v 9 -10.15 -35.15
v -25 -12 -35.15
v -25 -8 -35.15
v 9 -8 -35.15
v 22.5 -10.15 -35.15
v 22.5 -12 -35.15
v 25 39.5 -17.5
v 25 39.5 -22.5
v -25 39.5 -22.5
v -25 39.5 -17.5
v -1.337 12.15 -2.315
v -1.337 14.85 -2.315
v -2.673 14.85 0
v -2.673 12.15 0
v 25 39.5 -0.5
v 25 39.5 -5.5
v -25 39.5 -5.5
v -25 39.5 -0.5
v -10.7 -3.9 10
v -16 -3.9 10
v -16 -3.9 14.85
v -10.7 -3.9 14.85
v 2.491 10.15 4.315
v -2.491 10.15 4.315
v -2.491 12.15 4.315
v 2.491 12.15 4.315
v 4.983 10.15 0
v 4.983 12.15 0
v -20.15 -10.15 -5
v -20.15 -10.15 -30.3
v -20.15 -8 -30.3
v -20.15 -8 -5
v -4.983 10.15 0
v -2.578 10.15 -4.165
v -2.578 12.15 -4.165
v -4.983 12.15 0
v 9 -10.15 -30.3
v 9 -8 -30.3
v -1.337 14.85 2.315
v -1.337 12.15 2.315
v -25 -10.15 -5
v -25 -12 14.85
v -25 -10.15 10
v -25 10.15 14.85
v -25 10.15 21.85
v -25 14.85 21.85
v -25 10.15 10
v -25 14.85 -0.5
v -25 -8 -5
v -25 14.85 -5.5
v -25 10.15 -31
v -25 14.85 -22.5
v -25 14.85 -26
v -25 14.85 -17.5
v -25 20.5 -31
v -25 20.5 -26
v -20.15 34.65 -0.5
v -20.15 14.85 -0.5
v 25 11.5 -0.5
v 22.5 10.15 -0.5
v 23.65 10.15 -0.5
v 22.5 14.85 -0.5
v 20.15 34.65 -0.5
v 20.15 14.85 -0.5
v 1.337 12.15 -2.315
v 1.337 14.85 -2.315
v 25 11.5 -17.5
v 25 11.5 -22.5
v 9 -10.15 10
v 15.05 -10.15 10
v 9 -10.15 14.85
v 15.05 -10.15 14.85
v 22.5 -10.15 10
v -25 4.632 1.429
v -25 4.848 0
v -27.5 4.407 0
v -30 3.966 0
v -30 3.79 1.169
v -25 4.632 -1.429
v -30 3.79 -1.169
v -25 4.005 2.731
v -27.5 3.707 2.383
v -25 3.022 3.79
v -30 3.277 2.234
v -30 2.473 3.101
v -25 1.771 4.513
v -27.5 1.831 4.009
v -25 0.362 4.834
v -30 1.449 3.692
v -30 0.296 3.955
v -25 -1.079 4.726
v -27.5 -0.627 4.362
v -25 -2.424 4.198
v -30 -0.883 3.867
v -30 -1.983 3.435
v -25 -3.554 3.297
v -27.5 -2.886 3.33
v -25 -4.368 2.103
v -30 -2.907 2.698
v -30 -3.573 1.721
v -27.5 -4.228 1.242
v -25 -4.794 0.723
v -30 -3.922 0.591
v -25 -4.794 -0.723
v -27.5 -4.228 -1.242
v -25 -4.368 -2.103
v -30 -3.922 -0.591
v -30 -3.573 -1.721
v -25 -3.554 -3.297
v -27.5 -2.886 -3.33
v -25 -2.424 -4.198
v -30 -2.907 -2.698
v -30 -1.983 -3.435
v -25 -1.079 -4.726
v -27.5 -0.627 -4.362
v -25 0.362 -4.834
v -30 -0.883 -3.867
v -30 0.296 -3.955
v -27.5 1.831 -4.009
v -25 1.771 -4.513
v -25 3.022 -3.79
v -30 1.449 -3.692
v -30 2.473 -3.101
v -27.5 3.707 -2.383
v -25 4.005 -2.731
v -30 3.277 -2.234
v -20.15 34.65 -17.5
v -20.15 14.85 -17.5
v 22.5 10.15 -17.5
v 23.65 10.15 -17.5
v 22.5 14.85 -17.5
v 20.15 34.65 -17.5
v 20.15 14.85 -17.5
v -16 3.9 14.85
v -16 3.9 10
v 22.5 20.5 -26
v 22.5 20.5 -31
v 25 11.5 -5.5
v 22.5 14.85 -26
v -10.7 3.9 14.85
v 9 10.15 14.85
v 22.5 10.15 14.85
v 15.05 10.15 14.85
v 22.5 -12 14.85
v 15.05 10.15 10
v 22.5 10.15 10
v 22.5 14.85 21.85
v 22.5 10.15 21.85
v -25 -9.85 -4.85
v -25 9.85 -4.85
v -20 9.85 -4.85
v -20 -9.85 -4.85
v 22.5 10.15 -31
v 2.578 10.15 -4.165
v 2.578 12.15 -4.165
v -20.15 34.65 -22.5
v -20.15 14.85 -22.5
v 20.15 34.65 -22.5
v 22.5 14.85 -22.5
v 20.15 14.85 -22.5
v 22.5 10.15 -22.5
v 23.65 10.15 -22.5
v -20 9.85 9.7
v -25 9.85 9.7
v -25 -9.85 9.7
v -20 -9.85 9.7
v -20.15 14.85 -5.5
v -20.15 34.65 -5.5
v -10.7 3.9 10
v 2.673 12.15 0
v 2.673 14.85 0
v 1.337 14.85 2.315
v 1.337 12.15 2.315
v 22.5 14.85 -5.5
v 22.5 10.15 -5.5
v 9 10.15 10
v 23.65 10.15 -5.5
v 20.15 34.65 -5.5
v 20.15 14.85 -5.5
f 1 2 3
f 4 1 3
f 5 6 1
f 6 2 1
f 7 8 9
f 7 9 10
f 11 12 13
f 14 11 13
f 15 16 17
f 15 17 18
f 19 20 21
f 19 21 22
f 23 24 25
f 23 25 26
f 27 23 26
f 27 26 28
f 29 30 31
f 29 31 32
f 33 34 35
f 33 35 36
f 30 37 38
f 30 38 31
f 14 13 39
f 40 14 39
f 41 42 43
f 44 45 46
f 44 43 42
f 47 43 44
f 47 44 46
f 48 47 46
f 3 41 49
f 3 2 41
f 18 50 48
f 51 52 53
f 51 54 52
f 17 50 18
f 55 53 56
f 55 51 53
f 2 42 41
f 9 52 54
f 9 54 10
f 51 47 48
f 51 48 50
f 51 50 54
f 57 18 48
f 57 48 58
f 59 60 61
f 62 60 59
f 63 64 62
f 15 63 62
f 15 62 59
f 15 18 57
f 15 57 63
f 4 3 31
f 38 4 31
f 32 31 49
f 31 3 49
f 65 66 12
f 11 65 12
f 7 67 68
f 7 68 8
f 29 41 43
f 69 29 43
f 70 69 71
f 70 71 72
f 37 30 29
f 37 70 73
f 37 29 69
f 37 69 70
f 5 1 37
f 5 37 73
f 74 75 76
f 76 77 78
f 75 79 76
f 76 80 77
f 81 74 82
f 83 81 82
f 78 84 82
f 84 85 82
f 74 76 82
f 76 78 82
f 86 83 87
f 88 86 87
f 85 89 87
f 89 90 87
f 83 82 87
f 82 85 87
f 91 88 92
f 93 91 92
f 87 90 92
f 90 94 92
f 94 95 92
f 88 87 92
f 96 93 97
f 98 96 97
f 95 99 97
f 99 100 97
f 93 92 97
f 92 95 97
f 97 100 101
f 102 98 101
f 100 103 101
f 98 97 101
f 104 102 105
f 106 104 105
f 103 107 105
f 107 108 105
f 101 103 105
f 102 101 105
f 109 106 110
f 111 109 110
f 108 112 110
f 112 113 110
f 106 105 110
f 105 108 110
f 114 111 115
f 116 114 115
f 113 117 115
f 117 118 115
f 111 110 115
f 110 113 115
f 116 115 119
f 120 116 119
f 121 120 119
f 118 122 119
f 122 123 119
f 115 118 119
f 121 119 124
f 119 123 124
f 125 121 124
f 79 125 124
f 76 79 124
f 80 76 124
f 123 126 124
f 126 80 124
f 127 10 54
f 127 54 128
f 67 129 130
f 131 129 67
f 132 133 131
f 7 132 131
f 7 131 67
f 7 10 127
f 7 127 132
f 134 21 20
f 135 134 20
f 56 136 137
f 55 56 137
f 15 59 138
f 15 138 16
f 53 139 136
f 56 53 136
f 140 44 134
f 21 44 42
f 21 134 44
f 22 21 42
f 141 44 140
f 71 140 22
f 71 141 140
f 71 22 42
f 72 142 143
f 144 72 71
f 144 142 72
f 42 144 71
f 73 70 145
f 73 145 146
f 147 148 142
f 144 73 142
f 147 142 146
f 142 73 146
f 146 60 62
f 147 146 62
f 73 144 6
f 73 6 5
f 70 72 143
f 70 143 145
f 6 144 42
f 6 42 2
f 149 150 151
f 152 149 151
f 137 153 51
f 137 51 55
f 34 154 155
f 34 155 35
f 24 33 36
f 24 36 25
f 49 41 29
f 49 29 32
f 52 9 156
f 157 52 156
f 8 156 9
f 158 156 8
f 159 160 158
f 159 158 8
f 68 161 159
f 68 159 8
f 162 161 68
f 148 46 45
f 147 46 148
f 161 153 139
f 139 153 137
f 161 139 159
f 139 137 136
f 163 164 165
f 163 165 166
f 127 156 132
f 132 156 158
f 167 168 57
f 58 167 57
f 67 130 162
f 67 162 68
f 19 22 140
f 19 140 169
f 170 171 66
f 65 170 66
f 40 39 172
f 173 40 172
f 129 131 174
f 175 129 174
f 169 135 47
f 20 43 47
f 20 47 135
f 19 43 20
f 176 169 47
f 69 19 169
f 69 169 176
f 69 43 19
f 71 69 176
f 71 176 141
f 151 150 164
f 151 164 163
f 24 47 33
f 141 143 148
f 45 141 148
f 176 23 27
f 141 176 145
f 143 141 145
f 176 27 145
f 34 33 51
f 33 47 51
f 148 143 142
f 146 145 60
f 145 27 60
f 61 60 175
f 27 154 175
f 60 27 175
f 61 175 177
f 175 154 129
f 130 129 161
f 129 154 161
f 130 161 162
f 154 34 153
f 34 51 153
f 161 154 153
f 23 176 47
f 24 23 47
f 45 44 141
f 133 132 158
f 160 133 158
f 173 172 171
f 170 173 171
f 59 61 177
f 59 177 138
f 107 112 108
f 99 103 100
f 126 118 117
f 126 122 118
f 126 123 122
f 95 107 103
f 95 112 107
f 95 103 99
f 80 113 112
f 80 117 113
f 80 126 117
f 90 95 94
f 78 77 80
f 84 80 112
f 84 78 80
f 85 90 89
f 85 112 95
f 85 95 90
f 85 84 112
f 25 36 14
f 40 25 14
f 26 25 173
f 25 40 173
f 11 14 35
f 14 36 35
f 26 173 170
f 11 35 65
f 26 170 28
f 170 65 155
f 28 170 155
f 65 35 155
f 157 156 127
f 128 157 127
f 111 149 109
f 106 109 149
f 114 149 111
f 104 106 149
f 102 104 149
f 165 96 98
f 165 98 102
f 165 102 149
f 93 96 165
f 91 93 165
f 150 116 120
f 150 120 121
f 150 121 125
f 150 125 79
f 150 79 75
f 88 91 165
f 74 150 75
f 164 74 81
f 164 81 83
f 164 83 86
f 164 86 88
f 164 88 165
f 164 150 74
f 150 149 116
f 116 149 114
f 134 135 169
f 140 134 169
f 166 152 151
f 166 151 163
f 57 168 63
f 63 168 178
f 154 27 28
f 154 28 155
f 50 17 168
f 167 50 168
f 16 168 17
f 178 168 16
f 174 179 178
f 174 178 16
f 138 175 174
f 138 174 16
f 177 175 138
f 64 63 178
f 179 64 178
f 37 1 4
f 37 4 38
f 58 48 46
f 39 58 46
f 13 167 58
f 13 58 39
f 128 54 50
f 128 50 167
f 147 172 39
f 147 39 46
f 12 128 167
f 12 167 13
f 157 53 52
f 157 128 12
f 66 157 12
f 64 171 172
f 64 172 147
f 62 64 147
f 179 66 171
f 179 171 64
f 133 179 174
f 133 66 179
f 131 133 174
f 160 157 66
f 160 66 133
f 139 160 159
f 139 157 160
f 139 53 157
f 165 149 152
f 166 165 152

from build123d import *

# Parameters (mm, degrees)
MAIN_BODY_EXTRUDE_DEPTH            = 25
SKETCH2_W                          = 40
SKETCH2_H                          = 19.5
SKETCH2_W_2                        = 5.75
SKETCH2_H_2                        = 20
CUT_OUT_FOR_SERVO_AND_CAMERA_DEPTH = 69.448886039
CUT_EXTRUDE2_DEPTH                 = 5
CUT_EXTRUDE3_START                 = -5
CUT_EXTRUDE3_DEPTH                 = 2
MOVE_FACE1_BY                      = 2
SKETCH6_W                          = 5
SKETCH6_H                          = 7.5
CABLE_CLEARANCE_DEPTH              = 5
SKETCH7_W                          = 5
SKETCH7_H                          = 5.5
BOSS_EXTRUDE1_DEPTH                = 50
SKETCH8_R                          = 5
BOSS_EXTRUDE2_DEPTH                = 5
SKETCH8_3_R                        = 5
BOSS_EXTRUDE3_DEPTH                = 5
BOSS_EXTRUDE3_TAPER                = 10
SKETCH9_W                          = 25.15
SKETCH9_H                          = 2
BOSS_EXTRUDE4_DEPTH                = 5
INSET_THE_WALL_DEPTH               = 2.5
FRAME_CHAMFER_1_DEPTH              = 5
FRAME_START                        = -17
FRAME_CHAMFER_2_DEPTH              = 5
SKETCH12_W                         = 47.5
SKETCH12_H                         = 5
BOSS_EXTRUDE7_DEPTH                = 7
OFFSET_START                       = -5
OFFSET_FOR_3D_PRINT_OUTLINE_W      = 13
OFFSET_FOR_3D_PRINT_OUTLINE_H      = 0.15
OFFSET_FOR_3D_PRINT_DEPTH          = 14.85
OFFSET_FOR_3D_PRINT_2_OUTLINE_W    = 13
OFFSET_FOR_3D_PRINT_2_OUTLINE_H    = 19.7
OFFSET_FOR_3D_PRINT_2_DEPTH        = 0.15
OFFSET_START_2                     = 9.7
OFFSET_FOR_3D_PRINT_3_OUTLINE_W    = 13
OFFSET_FOR_3D_PRINT_3_OUTLINE_H    = 19.7
OFFSET_FOR_3D_PRINT_3_DEPTH        = 0.15
OFFSET_START_3                     = -10.15
OFFSET_FOR_3D_PRINT_5_DEPTH        = 20.3
OFFSET_START_4                     = 14.85
OFFSET_FOR_3D_PRINT_6_DEPTH        = 19.8
OFFSET_START_5                     = 10
OFFSET_FOR_3D_PRINT_7_DEPTH        = 0.15
OFFSET_START_6                     = -3.9
OFFSET_FOR_3D_PRINT_8_OUTLINE_W    = 5.3
OFFSET_FOR_3D_PRINT_8_OUTLINE_H    = 4.85
OFFSET_FOR_3D_PRINT_8_DEPTH        = 7.8
OFFSET_START_7                     = 10.15
OFFSET_FOR_3D_PRINT_9_DEPTH        = 2
OFFSET_START_8                     = 12.15
OFFSET_FOR_3D_PRINT_10_DEPTH       = 2.7


with BuildPart() as part:
    # Sketch1 → Main Body Extrude (new, symmetric)
    with BuildSketch(Plane(origin=(0, 0, 0), x_dir=(0, 0, -1), z_dir=(1, 0, 0))):
        Polygon((-14.85, -12), (35.15, -12), (35.15, -8), (30.15, -8), (30.15, -10), (-9.85, -10), (-9.85, 10), (22.5, 10), (22.5, 39.5), (17.5, 39.5), (17.5, 15), (5.5, 15), (5.5, 39.5), (0.5, 39.5), (0.5, 15), (-14.85, 15), align=None)
    extrude(amount=MAIN_BODY_EXTRUDE_DEPTH, both=True)

    # Sketch2 → Cut out for Servo and camera (cut, through all)
    with BuildSketch(Plane.XY.offset(14.85)):
        with Locations((0, 24.75)):
            Rectangle(SKETCH2_W, SKETCH2_H)
        with Locations((12.025, 0)):
            Rectangle(SKETCH2_W_2, SKETCH2_H_2)
    extrude(amount=-CUT_OUT_FOR_SERVO_AND_CAMERA_DEPTH, mode=Mode.SUBTRACT)

    # Sketch3 → Cut-Extrude2 (cut)
    with BuildSketch(Plane(origin=(0, 15, 0), x_dir=(1, 0, 0), z_dir=(0, 1, 0))):
        Polygon((2.5, 0), (1.25, 2.165063509), (-1.25, 2.165063509), (-2.5, 0), (-1.25, -2.165063509), (1.25, -2.165063509), align=None)
    extrude(amount=-CUT_EXTRUDE2_DEPTH, mode=Mode.SUBTRACT)

    # Sketch3<3> → Cut-Extrude3 (cut)
    with BuildSketch(Plane(origin=(0, 15, 0), x_dir=(1, 0, 0), z_dir=(0, 1, 0)).offset(CUT_EXTRUDE3_START)):
        Polygon((4.809401077, 0), (2.404700538, 4.165063509), (-2.404700538, 4.165063509), (-4.809401077, 0), (-2.404700538, -4.165063509), (2.404700538, -4.165063509), align=None)
    extrude(amount=CUT_EXTRUDE3_DEPTH, mode=Mode.SUBTRACT)

    # Move Face1: a face moved inward by 2.0
    extrude(part.faces().sort_by_distance((19.95, -8, -32.65))[0], amount=MOVE_FACE1_BY, dir=(0, -1, 0), mode=Mode.SUBTRACT)

    # Sketch6 → Cable Clearance (cut)
    with BuildSketch(Plane.XY.offset(14.85)):
        with Locations((-13.35, 0)):
            Rectangle(SKETCH6_W, SKETCH6_H)
    extrude(amount=-CABLE_CLEARANCE_DEPTH, mode=Mode.SUBTRACT)

    # Sketch7 → Boss-Extrude1 (add)
    with BuildSketch(Plane(origin=(25, 0, 0), x_dir=(0, 0, -1), z_dir=(1, 0, 0))):
        Polygon((22.5, 15), (22.5, 10), (31, 10), (31, 15), (26, 15), align=None)
        with Locations((28.5, 17.75)):
            Rectangle(SKETCH7_W, SKETCH7_H)
    extrude(amount=-BOSS_EXTRUDE1_DEPTH)

    # Sketch9 → Boss-Extrude4 (add)
    with BuildSketch(Plane.ZY.offset(25)):
        with Locations((-17.575, -9)):
            Rectangle(SKETCH9_W, SKETCH9_H)
    extrude(amount=-BOSS_EXTRUDE4_DEPTH)

    # Sketch10 → Inset the wall (cut)
    with BuildSketch(Plane(origin=(25, 0, 0), x_dir=(0, 0, -1), z_dir=(1, 0, 0))):
        Polygon((0.5, 15), (5.5, 15), (17.5, 15), (22.5, 15), (26, 15), (26, 20.5), (31, 20.5), (31, 10), (-9.85, 10), (-9.85, -10), (35.15, -10), (35.15, -12), (-14.85, -12), (-14.85, 15), align=None)
    extrude(amount=-INSET_THE_WALL_DEPTH, mode=Mode.SUBTRACT)

    # Sketch11 → Frame Chamfer 1 (add)
    with BuildSketch(Plane.XY.offset(-0.5)):
        Polygon((25, 11.5), (25, 15), (22.5, 15), (22.5, 10), (23.5, 10), align=None)
    extrude(amount=-FRAME_CHAMFER_1_DEPTH)

    # Sketch11<3> → Frame Chamfer 2 (add)
    with BuildSketch(Plane.XY.offset(-0.5).offset(FRAME_START)):
        Polygon((25, 11.5), (25, 15), (22.5, 15), (22.5, 10), (23.5, 10), align=None)
    extrude(amount=-FRAME_CHAMFER_2_DEPTH)

    # Sketch12 → Boss-Extrude7 (add)
    with BuildSketch(Plane.XY.offset(14.85)):
        with Locations((-1.25, 12.5)):
            Rectangle(SKETCH12_W, SKETCH12_H)
    extrude(amount=BOSS_EXTRUDE7_DEPTH)

    # Offset for 3D print 5 outline → Offset for 3D print 5 (cut)
    with BuildSketch(Plane(origin=(0, 0, 0), x_dir=(1, 0, 0), z_dir=(0, 1, 0)).offset(OFFSET_START_3)):
        Polygon((22.5, 0.5), (23.65, 0.5), (23.65, 5.5), (22.5, 5.5), (22.5, 17.5), (23.65, 17.5), (23.65, 22.5), (22.5, 22.5), (22.5, 35.15), (9, 35.15), (9, 30.3), (-20.15, 30.3), (-20.15, 5), (-25, 5), (-25, -10), (9, -10), (9, -14.85), (-25, -14.85), (-25, -21.85), (22.5, -21.85), (22.5, -14.85), (15.05, -14.85), (15.05, -10), (22.5, -10), align=None)
    extrude(amount=OFFSET_FOR_3D_PRINT_5_DEPTH, mode=Mode.SUBTRACT)

    # Offset for 3D print 6 outline → Offset for 3D print 6 (cut)
    with BuildSketch(Plane(origin=(0, 0, 0), x_dir=(1, 0, 0), z_dir=(0, 1, 0)).offset(OFFSET_START_4)):
        Polygon((-20.15, 0.5), (-25, 0.5), (-25, -21.85), (22.5, -21.85), (22.5, 0.5), (20.15, 0.5), (20.15, 5.5), (22.5, 5.5), (22.5, 17.5), (20.15, 17.5), (20.15, 22.5), (22.5, 22.5), (22.5, 26), (-25, 26), (-25, 22.5), (-20.15, 22.5), (-20.15, 17.5), (-25, 17.5), (-25, 5.5), (-20.15, 5.5), align=None)
        Polygon((-2.5, 0), (-2.211324865, 0.5), (2.211324865, 0.5), (2.5, 0), (1.25, -2.165063509), (-1.25, -2.165063509), align=None, mode=Mode.SUBTRACT)
    extrude(amount=OFFSET_FOR_3D_PRINT_6_DEPTH, mode=Mode.SUBTRACT)

    # Offset for 3D print 7 outline → Offset for 3D print 7 (cut)
    with BuildSketch(Plane(origin=(0, 0, 0), x_dir=(1, 0, 0), z_dir=(0, 1, 0)).offset(OFFSET_START_5)):
        Polygon((-25, 5), (-20.15, 5), (-20.15, 30.3), (9, 30.3), (9, 31), (-25, 31), align=None)
    extrude(amount=OFFSET_FOR_3D_PRINT_7_DEPTH, mode=Mode.SUBTRACT)

    # Offset for 3D print 8 outline → Offset for 3D print 8 (cut)
    with BuildSketch(Plane(origin=(0, 0, 0), x_dir=(1, 0, 0), z_dir=(0, 1, 0)).offset(OFFSET_START_6)):
        with Locations((-13.35, -12.425)):
            Rectangle(OFFSET_FOR_3D_PRINT_8_OUTLINE_W, OFFSET_FOR_3D_PRINT_8_OUTLINE_H)
    extrude(amount=OFFSET_FOR_3D_PRINT_8_DEPTH, mode=Mode.SUBTRACT)

    # Offset for 3D print 9 outline → Offset for 3D print 9 (cut)
    with BuildSketch(Plane(origin=(0, 0, 0), x_dir=(1, 0, 0), z_dir=(0, 1, 0)).offset(OFFSET_START_7)):
        Polygon((-4.982606158, 0), (-2.491303079, -4.315063509), (2.491303079, -4.315063509), (4.982606158, 0), (2.577905619, 4.165063509), (-2.577905619, 4.165063509), align=None)
        Polygon((-2.5, 0), (-1.25, 2.165063509), (1.25, 2.165063509), (2.5, 0), (1.25, -2.165063509), (-1.25, -2.165063509), align=None, mode=Mode.SUBTRACT)
    extrude(amount=OFFSET_FOR_3D_PRINT_9_DEPTH, mode=Mode.SUBTRACT)

    # Offset for 3D print 10 outline → Offset for 3D print 10 (cut)
    with BuildSketch(Plane(origin=(0, 0, 0), x_dir=(1, 0, 0), z_dir=(0, 1, 0)).offset(OFFSET_START_8)):
        Polygon((2.673205081, 0), (1.33660254, 2.315063509), (-1.33660254, 2.315063509), (-2.673205081, 0), (-1.33660254, -2.315063509), (1.33660254, -2.315063509), align=None)
        Polygon((-2.5, 0), (-1.25, 2.165063509), (1.25, 2.165063509), (2.5, 0), (1.25, -2.165063509), (-1.25, -2.165063509), align=None, mode=Mode.SUBTRACT)
    extrude(amount=OFFSET_FOR_3D_PRINT_10_DEPTH, mode=Mode.SUBTRACT)


with BuildPart() as body_2:
    # Sketch8 → Boss-Extrude2 (new body)
    # profile 1 of 2: a face of its own
    with BuildSketch(Plane.ZY.offset(25)):
        Polygon((9.85, -10), (9.85, 10), (-5, 10), (-5, 7e-09), (-5, -10), align=None)
        with BuildLine():
            ThreePointArc((5, 0), (-4e-09, -5), (-5, 7e-09))
            ThreePointArc((-5, 7e-09), (4e-09, 5), (5, 0))
        make_face(mode=Mode.SUBTRACT)
    # profile 2 of 2: a face of its own
    with BuildSketch(Plane.ZY.offset(25)):
        Circle(SKETCH8_R)
    extrude(amount=-BOSS_EXTRUDE2_DEPTH)

    # Sketch8<3> → Boss-Extrude3 (add)
    with BuildSketch(Plane.ZY.offset(25)):
        Circle(SKETCH8_3_R)
    extrude(amount=BOSS_EXTRUDE3_DEPTH, taper=BOSS_EXTRUDE3_TAPER)

    # Offset for 3D print: read off the stored shape, not the designer's step
    # Offset for 3D print outline → Offset for 3D print (cut)
    with BuildSketch(Plane.XY.offset(OFFSET_START)):
        with Locations((-25.5, 9.925)):
            Rectangle(OFFSET_FOR_3D_PRINT_OUTLINE_W, OFFSET_FOR_3D_PRINT_OUTLINE_H)
        with Locations((-25.5, -9.925)):
            Rectangle(OFFSET_FOR_3D_PRINT_OUTLINE_W, OFFSET_FOR_3D_PRINT_OUTLINE_H)
    extrude(amount=OFFSET_FOR_3D_PRINT_DEPTH, mode=Mode.SUBTRACT)

    # Offset for 3D print 2 outline → Offset for 3D print 2 (cut)
    with BuildSketch(Plane.XY.offset(OFFSET_START)):
        with Locations((-25.5, 0)):
            Rectangle(OFFSET_FOR_3D_PRINT_2_OUTLINE_W, OFFSET_FOR_3D_PRINT_2_OUTLINE_H)
    extrude(amount=OFFSET_FOR_3D_PRINT_2_DEPTH, mode=Mode.SUBTRACT)

    # Offset for 3D print 3 outline → Offset for 3D print 3 (cut)
    with BuildSketch(Plane.XY.offset(OFFSET_START_2)):
        with Locations((-25.5, 0)):
            Rectangle(OFFSET_FOR_3D_PRINT_3_OUTLINE_W, OFFSET_FOR_3D_PRINT_3_OUTLINE_H)
    extrude(amount=OFFSET_FOR_3D_PRINT_3_DEPTH, mode=Mode.SUBTRACT)

    # Offset for 3D print 4 outline → Offset for 3D print 4 (revolve, cut)
    with BuildSketch(Plane.YX):
        Polygon((3.966051105, -30), (4.118365096, -30), (5, -25), (4.847686008, -25), align=None)
    revolve(axis=Axis((0, 0, 0), (1, 0, 0)), mode=Mode.SUBTRACT)


solid = Compound([part.part, body_2.part])
